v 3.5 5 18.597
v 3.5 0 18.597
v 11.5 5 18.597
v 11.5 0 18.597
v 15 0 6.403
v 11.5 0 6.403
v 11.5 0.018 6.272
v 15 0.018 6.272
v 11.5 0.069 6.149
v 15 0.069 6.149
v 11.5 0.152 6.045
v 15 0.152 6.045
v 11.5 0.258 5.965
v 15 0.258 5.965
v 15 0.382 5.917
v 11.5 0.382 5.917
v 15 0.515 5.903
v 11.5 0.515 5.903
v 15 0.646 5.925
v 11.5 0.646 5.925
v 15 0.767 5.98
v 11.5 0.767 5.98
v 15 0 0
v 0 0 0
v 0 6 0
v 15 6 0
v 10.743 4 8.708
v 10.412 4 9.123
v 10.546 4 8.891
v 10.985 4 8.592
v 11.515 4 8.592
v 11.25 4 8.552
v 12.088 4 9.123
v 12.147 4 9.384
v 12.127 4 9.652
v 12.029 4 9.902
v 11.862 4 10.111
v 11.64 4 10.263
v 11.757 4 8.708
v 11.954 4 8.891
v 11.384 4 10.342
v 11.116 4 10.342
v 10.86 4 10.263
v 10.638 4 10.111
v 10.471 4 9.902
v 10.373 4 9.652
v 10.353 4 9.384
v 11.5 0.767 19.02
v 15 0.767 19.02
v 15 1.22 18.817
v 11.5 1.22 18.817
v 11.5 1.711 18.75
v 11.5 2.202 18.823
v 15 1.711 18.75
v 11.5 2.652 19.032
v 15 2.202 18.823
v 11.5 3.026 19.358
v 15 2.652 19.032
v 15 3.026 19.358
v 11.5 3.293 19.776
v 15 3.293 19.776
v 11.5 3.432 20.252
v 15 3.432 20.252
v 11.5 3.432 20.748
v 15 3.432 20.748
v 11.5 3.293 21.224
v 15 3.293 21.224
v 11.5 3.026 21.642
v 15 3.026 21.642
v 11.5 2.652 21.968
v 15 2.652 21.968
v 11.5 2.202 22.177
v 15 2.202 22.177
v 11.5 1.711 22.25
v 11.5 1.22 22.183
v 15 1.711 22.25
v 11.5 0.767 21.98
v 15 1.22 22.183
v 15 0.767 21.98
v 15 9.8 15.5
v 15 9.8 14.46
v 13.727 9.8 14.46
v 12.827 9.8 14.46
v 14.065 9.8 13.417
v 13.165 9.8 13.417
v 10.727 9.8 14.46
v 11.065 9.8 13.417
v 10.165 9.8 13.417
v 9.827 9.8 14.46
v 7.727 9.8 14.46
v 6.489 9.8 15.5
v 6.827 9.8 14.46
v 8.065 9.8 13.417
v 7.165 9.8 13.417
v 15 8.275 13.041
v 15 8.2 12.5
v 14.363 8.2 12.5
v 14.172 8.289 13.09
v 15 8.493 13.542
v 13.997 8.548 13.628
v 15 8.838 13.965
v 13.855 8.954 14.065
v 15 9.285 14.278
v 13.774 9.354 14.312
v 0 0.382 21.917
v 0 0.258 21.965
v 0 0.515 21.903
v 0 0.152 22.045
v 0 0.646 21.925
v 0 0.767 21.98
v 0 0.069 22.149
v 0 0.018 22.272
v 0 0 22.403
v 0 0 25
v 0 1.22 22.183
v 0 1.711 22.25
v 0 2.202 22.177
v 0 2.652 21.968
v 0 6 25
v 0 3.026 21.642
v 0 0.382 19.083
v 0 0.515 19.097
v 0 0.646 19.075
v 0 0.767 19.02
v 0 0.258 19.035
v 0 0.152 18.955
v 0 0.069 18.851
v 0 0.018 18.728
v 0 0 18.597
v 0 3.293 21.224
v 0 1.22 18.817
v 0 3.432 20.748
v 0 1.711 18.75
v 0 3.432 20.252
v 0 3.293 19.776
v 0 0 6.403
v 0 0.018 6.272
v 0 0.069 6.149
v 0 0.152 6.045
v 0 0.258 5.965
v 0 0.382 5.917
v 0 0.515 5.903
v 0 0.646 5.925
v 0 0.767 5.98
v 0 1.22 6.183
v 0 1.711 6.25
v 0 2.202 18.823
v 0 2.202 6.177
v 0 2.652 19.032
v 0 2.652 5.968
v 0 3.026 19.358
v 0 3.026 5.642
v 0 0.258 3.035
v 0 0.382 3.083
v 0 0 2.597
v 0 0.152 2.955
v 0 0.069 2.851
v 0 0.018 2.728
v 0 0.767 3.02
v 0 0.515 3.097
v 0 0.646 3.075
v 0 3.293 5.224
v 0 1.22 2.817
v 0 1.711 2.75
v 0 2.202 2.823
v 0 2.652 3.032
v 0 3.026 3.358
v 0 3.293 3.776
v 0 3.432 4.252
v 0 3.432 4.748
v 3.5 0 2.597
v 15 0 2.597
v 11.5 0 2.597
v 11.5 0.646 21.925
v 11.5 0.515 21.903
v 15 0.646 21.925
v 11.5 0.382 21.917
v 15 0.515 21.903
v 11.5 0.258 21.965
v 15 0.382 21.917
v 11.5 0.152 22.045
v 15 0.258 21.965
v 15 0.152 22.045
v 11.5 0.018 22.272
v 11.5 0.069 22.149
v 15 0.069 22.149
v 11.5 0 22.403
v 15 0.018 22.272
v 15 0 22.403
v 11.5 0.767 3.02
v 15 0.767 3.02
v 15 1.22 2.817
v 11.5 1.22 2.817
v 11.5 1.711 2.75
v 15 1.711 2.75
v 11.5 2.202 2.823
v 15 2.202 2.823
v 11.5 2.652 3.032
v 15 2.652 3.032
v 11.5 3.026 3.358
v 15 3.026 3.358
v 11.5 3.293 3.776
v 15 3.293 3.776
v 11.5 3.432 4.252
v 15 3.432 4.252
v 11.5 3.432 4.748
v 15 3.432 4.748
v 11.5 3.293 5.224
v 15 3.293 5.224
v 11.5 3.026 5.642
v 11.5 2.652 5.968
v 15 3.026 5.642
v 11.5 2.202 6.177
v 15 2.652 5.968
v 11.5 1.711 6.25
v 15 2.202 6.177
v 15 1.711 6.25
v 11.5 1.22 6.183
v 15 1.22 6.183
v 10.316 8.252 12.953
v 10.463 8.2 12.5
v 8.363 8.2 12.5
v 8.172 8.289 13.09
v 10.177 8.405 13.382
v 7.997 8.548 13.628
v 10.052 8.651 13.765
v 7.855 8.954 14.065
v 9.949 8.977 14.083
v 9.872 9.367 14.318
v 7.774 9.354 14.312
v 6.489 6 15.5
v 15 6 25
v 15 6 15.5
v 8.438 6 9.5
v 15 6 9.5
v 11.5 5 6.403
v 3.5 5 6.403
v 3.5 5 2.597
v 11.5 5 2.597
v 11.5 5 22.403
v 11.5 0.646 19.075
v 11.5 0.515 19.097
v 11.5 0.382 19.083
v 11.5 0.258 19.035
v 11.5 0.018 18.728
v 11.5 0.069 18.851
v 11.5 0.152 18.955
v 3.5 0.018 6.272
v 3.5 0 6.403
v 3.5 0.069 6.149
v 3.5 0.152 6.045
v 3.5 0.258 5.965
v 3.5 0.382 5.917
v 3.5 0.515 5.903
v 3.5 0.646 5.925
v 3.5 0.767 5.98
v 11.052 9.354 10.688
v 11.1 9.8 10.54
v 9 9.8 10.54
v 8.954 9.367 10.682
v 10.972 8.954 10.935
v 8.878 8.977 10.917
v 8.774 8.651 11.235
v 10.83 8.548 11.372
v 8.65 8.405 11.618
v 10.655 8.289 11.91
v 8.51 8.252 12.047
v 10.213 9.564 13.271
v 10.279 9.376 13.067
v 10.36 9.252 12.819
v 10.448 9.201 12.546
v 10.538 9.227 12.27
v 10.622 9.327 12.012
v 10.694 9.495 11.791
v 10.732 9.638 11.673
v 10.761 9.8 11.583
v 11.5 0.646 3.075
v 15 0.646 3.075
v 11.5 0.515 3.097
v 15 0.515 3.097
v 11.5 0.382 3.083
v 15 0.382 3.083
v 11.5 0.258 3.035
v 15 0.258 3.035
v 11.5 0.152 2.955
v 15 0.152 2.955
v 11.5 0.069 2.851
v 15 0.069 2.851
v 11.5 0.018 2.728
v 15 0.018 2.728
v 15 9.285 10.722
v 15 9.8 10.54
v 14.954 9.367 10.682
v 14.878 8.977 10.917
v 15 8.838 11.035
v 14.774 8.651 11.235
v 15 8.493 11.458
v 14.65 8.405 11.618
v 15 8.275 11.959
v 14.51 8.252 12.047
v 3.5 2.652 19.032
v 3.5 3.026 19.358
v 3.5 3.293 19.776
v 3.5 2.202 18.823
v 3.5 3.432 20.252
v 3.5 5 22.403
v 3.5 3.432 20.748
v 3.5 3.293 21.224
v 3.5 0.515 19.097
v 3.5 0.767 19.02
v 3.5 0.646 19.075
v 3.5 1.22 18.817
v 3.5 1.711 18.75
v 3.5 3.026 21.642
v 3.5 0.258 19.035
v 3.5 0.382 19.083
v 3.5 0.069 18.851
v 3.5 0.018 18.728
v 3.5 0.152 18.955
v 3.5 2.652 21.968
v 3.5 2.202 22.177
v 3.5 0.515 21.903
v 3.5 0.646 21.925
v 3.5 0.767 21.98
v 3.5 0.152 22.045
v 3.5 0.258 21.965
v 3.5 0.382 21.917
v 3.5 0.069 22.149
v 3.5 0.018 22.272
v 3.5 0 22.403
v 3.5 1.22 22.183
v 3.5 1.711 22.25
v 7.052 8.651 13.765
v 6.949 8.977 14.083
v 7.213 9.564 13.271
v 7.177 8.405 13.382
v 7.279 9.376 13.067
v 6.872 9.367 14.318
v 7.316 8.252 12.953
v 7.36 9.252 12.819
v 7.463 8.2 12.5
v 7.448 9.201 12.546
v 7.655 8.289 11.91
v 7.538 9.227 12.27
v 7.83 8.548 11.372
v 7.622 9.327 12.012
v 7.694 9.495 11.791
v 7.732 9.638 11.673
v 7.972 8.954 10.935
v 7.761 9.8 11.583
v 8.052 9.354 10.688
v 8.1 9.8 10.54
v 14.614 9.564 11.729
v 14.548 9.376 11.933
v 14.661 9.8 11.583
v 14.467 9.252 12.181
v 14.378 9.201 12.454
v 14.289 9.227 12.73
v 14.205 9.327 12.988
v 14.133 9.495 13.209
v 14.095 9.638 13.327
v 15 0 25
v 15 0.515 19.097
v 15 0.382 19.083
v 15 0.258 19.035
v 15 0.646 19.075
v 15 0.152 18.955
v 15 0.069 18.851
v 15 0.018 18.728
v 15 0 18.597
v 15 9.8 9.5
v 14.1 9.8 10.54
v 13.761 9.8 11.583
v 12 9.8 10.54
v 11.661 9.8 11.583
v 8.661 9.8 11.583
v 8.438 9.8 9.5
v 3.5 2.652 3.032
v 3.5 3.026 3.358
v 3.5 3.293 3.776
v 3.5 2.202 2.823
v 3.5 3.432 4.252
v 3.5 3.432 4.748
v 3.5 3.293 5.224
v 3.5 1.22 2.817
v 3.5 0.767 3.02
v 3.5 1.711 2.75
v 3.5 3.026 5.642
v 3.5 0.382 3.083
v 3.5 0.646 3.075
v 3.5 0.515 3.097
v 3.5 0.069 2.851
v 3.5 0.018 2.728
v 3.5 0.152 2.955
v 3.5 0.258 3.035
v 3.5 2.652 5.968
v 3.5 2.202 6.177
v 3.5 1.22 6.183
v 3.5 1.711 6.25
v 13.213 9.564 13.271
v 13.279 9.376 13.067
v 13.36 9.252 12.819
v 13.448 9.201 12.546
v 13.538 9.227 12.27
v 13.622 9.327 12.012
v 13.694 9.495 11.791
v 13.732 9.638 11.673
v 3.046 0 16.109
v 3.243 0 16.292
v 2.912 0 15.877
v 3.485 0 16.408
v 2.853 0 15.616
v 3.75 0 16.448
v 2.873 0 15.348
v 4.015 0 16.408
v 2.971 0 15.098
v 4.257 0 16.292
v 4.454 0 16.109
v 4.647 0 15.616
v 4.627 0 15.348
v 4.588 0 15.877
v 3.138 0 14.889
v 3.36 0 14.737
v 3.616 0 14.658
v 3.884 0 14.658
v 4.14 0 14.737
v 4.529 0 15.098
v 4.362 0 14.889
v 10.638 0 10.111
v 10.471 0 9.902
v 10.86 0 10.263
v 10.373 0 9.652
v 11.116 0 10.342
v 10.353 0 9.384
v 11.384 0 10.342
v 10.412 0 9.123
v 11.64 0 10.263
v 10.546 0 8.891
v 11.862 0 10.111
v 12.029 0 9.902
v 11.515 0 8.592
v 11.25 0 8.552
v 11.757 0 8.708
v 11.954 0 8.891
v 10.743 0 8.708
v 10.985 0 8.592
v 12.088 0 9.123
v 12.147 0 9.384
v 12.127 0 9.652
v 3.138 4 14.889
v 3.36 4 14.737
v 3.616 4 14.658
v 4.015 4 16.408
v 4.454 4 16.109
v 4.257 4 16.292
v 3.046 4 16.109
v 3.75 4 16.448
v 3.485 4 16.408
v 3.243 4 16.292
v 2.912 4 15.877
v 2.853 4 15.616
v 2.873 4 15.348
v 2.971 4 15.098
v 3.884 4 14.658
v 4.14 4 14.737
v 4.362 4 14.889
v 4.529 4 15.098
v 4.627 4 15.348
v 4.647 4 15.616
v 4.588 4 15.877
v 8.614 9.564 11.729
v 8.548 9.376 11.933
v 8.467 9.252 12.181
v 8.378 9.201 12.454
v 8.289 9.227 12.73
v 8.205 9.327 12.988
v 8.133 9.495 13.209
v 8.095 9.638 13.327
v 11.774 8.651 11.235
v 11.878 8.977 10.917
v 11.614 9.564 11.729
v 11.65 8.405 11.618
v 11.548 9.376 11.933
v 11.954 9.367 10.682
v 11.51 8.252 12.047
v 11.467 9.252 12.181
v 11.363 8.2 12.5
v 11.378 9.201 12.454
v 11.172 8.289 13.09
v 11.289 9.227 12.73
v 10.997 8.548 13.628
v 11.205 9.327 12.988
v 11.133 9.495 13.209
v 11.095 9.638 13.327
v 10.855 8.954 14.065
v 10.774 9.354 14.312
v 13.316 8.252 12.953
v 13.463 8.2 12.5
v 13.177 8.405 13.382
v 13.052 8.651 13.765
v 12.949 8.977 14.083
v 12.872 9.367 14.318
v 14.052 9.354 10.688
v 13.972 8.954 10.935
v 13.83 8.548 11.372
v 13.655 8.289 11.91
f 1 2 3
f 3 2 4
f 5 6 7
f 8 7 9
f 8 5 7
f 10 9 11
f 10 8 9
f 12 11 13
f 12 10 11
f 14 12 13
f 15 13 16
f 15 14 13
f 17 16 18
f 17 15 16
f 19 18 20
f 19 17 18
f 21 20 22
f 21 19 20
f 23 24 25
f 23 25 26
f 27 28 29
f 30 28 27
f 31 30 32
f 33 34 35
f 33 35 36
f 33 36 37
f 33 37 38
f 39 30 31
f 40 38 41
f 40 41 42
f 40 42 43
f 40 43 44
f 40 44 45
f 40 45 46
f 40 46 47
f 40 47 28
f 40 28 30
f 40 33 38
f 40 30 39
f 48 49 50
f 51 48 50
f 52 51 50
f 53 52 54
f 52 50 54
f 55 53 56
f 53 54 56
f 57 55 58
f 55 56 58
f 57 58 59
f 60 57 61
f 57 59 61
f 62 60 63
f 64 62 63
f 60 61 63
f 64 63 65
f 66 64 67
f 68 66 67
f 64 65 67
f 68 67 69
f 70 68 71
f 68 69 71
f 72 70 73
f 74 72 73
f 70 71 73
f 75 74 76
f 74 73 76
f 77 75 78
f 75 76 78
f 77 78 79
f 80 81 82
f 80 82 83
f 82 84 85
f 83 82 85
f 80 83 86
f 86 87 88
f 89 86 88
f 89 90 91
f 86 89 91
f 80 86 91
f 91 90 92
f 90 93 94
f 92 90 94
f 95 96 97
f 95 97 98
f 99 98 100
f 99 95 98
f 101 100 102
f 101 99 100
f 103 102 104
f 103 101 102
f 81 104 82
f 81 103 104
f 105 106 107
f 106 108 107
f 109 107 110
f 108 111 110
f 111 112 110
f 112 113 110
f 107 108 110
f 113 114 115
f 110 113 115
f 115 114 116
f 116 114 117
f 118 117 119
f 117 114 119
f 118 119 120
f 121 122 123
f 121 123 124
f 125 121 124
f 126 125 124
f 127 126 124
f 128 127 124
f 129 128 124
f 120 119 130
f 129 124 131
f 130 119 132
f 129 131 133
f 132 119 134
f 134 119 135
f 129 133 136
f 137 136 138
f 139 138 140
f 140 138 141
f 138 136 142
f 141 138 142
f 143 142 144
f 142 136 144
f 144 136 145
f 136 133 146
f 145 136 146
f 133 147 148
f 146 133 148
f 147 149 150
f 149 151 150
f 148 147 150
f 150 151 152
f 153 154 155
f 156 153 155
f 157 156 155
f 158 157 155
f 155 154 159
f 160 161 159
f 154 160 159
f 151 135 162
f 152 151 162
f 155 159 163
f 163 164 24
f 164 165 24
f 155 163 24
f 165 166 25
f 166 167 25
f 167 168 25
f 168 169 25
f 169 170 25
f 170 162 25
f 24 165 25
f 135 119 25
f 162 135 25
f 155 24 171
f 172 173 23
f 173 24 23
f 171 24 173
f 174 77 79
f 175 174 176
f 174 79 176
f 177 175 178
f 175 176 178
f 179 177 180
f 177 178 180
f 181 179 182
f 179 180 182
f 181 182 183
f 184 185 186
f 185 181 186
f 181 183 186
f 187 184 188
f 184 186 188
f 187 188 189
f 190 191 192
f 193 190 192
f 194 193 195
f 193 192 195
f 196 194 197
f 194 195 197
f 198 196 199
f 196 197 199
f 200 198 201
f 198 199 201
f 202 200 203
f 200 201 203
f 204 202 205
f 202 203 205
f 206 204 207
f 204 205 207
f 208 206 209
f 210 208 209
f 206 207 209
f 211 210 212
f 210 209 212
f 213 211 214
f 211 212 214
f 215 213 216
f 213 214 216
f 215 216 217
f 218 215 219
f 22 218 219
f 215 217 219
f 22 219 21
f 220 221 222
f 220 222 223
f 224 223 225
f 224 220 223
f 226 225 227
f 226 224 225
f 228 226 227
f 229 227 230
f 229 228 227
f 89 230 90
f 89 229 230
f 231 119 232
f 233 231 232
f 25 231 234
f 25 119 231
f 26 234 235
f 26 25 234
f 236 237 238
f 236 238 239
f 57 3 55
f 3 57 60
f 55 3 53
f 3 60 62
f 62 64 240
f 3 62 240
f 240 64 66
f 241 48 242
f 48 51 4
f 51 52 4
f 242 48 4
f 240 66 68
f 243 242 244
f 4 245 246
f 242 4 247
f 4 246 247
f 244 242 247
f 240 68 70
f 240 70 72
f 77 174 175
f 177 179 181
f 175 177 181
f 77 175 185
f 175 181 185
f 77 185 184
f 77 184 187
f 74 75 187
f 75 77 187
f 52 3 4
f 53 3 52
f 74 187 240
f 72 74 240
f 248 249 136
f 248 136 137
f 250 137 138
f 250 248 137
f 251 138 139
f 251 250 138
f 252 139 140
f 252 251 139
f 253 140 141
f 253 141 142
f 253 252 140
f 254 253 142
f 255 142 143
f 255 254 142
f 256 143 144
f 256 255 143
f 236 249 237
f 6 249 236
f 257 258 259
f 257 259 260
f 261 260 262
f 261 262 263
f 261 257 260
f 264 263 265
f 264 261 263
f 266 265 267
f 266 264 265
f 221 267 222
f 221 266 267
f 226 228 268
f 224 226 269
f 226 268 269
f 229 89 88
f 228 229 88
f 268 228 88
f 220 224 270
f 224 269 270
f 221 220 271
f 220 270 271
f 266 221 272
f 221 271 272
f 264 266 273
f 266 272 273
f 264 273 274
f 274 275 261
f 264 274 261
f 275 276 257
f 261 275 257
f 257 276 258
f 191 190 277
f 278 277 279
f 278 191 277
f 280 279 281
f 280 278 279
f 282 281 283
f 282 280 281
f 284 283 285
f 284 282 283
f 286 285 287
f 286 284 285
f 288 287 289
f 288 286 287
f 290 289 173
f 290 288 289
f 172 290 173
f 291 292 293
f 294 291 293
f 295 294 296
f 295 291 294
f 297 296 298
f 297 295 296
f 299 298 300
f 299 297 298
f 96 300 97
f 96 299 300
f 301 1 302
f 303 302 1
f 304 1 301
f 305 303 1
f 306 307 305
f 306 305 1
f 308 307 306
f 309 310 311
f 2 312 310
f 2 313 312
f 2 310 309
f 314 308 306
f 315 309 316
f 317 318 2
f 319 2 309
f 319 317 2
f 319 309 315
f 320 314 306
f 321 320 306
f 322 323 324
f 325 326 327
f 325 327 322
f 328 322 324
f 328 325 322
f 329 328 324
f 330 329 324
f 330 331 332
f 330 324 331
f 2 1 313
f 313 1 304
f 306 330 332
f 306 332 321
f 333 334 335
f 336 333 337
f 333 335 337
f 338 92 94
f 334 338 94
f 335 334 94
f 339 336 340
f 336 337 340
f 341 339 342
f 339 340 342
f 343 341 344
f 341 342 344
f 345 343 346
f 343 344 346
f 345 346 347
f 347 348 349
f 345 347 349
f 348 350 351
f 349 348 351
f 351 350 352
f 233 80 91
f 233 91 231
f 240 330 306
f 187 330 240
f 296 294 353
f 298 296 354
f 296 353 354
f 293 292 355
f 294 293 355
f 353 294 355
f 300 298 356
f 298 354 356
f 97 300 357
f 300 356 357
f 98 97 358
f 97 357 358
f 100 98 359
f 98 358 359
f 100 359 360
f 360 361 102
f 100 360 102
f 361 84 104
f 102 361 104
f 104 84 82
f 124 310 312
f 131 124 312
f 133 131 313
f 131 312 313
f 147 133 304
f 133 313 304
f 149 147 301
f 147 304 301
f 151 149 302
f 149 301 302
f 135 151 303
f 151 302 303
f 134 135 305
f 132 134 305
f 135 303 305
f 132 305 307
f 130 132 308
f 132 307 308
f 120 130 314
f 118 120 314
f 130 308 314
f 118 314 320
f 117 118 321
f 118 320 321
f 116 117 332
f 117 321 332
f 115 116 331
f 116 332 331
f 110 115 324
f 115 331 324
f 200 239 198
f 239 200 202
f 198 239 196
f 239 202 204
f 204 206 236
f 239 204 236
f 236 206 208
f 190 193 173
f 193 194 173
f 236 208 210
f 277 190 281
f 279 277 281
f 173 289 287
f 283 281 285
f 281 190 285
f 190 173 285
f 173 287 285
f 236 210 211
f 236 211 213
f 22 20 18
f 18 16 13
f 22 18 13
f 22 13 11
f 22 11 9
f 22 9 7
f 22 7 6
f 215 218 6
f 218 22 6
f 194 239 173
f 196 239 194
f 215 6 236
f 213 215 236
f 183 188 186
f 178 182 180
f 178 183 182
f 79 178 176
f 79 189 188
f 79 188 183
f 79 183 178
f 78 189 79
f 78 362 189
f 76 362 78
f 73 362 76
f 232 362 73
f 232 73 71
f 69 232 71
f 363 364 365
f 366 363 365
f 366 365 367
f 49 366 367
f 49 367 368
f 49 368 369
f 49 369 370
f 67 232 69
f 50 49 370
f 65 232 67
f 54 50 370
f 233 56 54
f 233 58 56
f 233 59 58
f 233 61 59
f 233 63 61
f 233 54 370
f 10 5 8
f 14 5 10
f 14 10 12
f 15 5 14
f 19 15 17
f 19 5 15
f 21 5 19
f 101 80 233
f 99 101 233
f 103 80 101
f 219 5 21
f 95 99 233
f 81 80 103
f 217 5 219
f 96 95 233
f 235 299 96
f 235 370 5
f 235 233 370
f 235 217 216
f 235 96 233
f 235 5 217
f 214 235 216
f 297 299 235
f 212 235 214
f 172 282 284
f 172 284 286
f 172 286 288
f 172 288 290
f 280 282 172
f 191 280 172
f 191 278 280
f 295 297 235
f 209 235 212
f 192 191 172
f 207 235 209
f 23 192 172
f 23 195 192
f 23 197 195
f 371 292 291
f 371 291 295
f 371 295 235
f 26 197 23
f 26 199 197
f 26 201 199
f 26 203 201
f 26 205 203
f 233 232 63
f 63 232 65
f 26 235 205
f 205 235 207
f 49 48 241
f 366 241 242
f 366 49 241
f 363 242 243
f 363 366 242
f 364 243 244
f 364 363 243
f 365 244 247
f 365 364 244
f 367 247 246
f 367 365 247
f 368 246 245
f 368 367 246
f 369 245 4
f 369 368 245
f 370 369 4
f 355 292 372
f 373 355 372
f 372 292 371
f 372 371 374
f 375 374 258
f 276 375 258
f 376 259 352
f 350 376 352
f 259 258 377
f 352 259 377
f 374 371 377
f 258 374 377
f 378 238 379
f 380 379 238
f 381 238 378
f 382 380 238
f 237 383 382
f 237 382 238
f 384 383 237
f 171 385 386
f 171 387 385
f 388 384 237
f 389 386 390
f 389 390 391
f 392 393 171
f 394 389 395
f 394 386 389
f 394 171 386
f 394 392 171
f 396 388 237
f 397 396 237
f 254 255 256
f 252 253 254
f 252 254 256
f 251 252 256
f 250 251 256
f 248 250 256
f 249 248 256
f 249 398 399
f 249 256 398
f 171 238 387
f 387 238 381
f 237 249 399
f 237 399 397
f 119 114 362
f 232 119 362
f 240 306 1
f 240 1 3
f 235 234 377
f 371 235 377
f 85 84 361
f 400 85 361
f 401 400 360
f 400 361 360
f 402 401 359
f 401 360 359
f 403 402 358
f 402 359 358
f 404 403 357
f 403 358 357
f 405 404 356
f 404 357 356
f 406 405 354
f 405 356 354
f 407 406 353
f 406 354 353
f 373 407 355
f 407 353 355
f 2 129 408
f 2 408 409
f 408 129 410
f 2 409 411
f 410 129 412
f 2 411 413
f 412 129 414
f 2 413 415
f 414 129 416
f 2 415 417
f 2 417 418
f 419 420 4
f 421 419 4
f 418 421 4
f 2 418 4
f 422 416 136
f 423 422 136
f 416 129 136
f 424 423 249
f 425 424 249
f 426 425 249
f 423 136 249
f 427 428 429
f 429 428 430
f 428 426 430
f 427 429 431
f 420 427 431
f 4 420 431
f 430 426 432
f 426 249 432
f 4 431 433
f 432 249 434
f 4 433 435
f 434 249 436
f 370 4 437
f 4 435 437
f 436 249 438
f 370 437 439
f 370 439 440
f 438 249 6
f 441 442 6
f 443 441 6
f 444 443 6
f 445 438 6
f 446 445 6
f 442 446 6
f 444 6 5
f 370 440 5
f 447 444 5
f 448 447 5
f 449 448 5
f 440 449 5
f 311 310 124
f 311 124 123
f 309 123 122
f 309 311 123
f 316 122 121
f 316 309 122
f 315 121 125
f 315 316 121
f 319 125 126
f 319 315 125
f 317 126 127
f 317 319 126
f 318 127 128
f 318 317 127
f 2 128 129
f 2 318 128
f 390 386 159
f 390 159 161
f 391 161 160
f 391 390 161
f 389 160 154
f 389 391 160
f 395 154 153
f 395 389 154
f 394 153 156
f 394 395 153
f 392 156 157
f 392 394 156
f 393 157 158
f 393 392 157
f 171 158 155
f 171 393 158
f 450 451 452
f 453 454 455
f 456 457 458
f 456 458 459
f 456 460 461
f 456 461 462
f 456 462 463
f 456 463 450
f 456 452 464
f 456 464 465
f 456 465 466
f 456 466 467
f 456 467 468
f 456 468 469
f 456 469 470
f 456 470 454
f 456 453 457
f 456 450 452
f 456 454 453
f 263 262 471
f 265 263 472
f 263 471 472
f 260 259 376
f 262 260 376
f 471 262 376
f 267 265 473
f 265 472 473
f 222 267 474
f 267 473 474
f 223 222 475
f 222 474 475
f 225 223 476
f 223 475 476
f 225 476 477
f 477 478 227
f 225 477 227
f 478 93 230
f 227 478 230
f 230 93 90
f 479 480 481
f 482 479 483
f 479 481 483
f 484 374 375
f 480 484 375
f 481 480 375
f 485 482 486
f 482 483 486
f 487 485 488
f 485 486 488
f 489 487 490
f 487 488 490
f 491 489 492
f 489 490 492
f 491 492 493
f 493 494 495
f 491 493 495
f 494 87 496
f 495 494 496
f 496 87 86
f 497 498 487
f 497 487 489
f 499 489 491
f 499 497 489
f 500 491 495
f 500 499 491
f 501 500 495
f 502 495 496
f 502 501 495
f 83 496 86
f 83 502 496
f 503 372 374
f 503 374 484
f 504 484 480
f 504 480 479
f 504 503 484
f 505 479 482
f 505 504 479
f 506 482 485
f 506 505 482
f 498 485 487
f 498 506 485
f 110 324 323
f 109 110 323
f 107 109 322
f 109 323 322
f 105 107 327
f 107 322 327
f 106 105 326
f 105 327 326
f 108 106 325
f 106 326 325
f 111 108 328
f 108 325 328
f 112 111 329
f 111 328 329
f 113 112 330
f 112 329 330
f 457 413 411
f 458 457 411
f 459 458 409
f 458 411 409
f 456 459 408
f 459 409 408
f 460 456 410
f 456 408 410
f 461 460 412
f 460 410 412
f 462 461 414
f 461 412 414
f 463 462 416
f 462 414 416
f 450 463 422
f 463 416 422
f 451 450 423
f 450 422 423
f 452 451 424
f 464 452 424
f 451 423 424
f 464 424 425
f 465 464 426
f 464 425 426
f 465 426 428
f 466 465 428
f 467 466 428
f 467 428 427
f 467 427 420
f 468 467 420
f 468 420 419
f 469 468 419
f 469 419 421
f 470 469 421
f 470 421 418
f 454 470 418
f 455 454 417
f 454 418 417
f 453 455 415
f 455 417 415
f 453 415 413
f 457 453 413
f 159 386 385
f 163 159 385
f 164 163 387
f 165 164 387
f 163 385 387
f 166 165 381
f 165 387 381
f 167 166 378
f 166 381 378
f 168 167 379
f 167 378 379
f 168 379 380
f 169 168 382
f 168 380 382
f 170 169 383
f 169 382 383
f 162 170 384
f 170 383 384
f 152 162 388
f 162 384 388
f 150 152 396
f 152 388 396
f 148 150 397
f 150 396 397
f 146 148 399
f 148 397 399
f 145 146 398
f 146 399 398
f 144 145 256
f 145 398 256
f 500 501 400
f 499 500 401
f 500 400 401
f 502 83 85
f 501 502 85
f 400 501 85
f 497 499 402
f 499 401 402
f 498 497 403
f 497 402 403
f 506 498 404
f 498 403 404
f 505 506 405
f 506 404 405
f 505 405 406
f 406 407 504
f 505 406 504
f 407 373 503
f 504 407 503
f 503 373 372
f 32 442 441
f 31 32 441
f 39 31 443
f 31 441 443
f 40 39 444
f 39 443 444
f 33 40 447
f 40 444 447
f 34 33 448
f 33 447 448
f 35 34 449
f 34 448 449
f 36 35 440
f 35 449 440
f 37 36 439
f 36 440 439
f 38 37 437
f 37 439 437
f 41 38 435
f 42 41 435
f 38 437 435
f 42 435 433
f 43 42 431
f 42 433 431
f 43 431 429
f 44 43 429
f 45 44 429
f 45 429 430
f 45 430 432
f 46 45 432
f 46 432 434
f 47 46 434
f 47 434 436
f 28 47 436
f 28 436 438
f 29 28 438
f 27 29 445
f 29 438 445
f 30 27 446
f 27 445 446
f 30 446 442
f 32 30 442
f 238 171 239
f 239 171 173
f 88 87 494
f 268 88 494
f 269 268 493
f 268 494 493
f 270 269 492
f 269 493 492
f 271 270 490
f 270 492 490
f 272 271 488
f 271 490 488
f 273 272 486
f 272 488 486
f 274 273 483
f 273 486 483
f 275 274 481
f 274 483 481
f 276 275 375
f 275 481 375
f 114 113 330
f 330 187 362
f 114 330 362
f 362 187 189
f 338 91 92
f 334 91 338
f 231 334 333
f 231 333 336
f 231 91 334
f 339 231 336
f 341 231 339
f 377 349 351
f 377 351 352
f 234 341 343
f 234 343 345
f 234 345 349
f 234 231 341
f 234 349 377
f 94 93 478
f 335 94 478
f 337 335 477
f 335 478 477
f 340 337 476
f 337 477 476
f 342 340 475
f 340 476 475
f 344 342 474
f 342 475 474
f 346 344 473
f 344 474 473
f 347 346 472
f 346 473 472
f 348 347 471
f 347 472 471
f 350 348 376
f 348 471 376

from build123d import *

# Parameters (mm, degrees)
SKETCH_1_W          = 15
SKETCH_1_H          = 25
EXTRUDE_1_DEPTH     = 6
SKETCH_3_R          = 1.75
CUT_EXTRUDE_1_DEPTH = 15
FILLET_1_R          = 0.5
SKETCH_4_W          = 15
SKETCH_4_H          = 6
EXTRUDE_3_DEPTH     = 2.2
EXTRUDE_4_DEPTH     = 15
EXTRUDE_5_REACH     = 32.758
CUT_EXTRUDE_2_REACH = 32.758
SKETCH_8_R          = 1
CUT_EXTRUDE_START   = 6
CUT_EXTRUDE_3_DEPTH = 3.8
SKETCH_10_W         = 8
SKETCH_10_H         = 3.806573262
CUT_EXTRUDE_5_DEPTH = 5
SKETCH_12_R         = 0.9
CUT_EXTRUDE_7_DEPTH = 4


# Read off the part's stored shape, not the designer's step: 切除-拉伸3
with BuildPart() as part:
    # 草图1 → 凸台-拉伸1 (new body)
    with BuildSketch(Plane(origin=(0, 0, 0), x_dir=(1, 0, 0), z_dir=(0, 1, 0))):
        with Locations((7.5, -12.5)):
            Rectangle(SKETCH_1_W, SKETCH_1_H)
    extrude(amount=EXTRUDE_1_DEPTH)

    # 草图3 → 切除-拉伸1 (cut)
    with BuildSketch(Plane(origin=(15, 0, 0), x_dir=(0, 0, -1), z_dir=(1, 0, 0))):
        with Locations((-20.5, 1.7)):
            Circle(SKETCH_3_R)
        with Locations((-4.5, 1.7)):
            Circle(SKETCH_3_R)
    extrude(amount=-CUT_EXTRUDE_1_DEPTH, mode=Mode.SUBTRACT)

    # 圆角1
    fillet_1_edges = [part.edges().sort_by_distance(p)[0] for p in [
        (7.5, 0, 4.084668807),
        (7.5, 0, 4.915331193),
        (7.5, 0, 20.084668807),
        (7.5, 0, 20.915331193),
    ]]
    fillet(fillet_1_edges, radius=FILLET_1_R)

    # 草图4 → 凸台-拉伸3 (add)
    with BuildSketch(Plane(origin=(0, 6, 0), x_dir=(1, 0, 0), z_dir=(0, 1, 0))):
        with Locations((7.5, -12.5)):
            Rectangle(SKETCH_4_W, SKETCH_4_H)
    extrude(amount=EXTRUDE_3_DEPTH)

    # 草图6 → 凸台-拉伸4 (add)
    with BuildSketch(Plane(origin=(15, 0, 0), x_dir=(0, 0, -1), z_dir=(1, 0, 0))):
        with BuildLine():
            ThreePointArc((-10.540408206, 9.8), (-11.235088936, 8.650806662), (-12.5, 8.2))
            Line((-12.5, 8.2), (-9.5, 8.2))
            Line((-9.5, 8.2), (-9.5, 9.8))
            Line((-9.5, 9.8), (-10.540408206, 9.8))
        make_face()
        with BuildLine():
            Line((-15.5, 9.8), (-15.5, 8.2))
            Line((-15.5, 8.2), (-12.5, 8.2))
            ThreePointArc((-12.5, 8.2), (-13.764911064, 8.650806662), (-14.459591794, 9.8))
            Line((-14.459591794, 9.8), (-15.5, 9.8))
        make_face()
    extrude(amount=-EXTRUDE_4_DEPTH)

    # 草图7 → 凸台-拉伸5 (add, up to next)
    with BuildSketch(Plane(origin=(0, 9.8, 0), x_dir=(1, 0, 0), z_dir=(0, 1, 0)), mode=Mode.PRIVATE) as extrude_5_sk1:
        Polygon((14.1, -10.540408206), (15, -10.540408206), (13.726580059, -14.459591794), (12.826580059, -14.459591794), align=None)
    extrude_5_tool1 = extrude(extrude_5_sk1.sketch, amount=-EXTRUDE_5_REACH, mode=Mode.PRIVATE) - part.part
    # 草图7 → 凸台-拉伸5 (add, up to next)
    with BuildSketch(Plane(origin=(0, 9.8, 0), x_dir=(1, 0, 0), z_dir=(0, 1, 0)), mode=Mode.PRIVATE) as extrude_5_sk2:
        Polygon((11.1, -10.540408206), (12, -10.540408206), (10.726580059, -14.459591794), (9.826580059, -14.459591794), align=None)
    extrude_5_tool2 = extrude(extrude_5_sk2.sketch, amount=-EXTRUDE_5_REACH, mode=Mode.PRIVATE) - part.part
    # 草图7 → 凸台-拉伸5 (add, up to next)
    with BuildSketch(Plane(origin=(0, 9.8, 0), x_dir=(1, 0, 0), z_dir=(0, 1, 0)), mode=Mode.PRIVATE) as extrude_5_sk3:
        Polygon((8.1, -10.540408206), (9, -10.540408206), (7.726580059, -14.459591794), (6.826580059, -14.459591794), align=None)
    extrude_5_tool3 = extrude(extrude_5_sk3.sketch, amount=-EXTRUDE_5_REACH, mode=Mode.PRIVATE) - part.part
    # 草图7 → 凸台-拉伸5 (add, up to next)
    with BuildSketch(Plane(origin=(0, 9.8, 0), x_dir=(1, 0, 0), z_dir=(0, 1, 0)), mode=Mode.PRIVATE) as extrude_5_sk4:
        Polygon((5.1, -10.540408206), (6, -10.540408206), (4.726580059, -14.459591794), (3.826580059, -14.459591794), align=None)
    extrude_5_tool4 = extrude(extrude_5_sk4.sketch, amount=-EXTRUDE_5_REACH, mode=Mode.PRIVATE) - part.part
    # 草图7 → 凸台-拉伸5 (add, up to next)
    with BuildSketch(Plane(origin=(0, 9.8, 0), x_dir=(1, 0, 0), z_dir=(0, 1, 0)), mode=Mode.PRIVATE) as extrude_5_sk5:
        Polygon((2.1, -10.540408206), (3, -10.540408206), (1.726580059, -14.459591794), (0.826580059, -14.459591794), align=None)
    extrude_5_tool5 = extrude(extrude_5_sk5.sketch, amount=-EXTRUDE_5_REACH, mode=Mode.PRIVATE) - part.part
    add(extrude_5_tool1.solids().sort_by_distance((13.91329, 9.8, 12.5))[0])
    add(extrude_5_tool2.solids().sort_by_distance((10.91329, 9.8, 12.5))[0])
    add(extrude_5_tool3.solids().sort_by_distance((7.91329, 9.8, 12.5))[0])
    add(extrude_5_tool4.solids().sort_by_distance((4.91329, 9.8, 12.5))[0])
    add(extrude_5_tool5.solids().sort_by_distance((1.91329, 9.8, 12.5))[0])

    # 切除-拉伸2: up to this face of the body (flat: up to its plane)
    cut_extrude_2_end = Plane(part.part.faces().sort_by_distance((0, 3.752278375, 12.5))[0])
    # 草图8 → 切除-拉伸2 (cut, up to the picked face)
    with BuildSketch(Plane(origin=(15, 0, 0), x_dir=(0, 0, -1), z_dir=(1, 0, 0)), mode=Mode.PRIVATE) as cut_extrude_2_sk1:
        with Locations((-12.5, 10.2)):
            Circle(SKETCH_8_R)
    cut_extrude_2_tool1 = split(extrude(cut_extrude_2_sk1.sketch, amount=-CUT_EXTRUDE_2_REACH, mode=Mode.PRIVATE), bisect_by=cut_extrude_2_end, keep=Keep.BOTH, mode=Mode.PRIVATE)
    add(cut_extrude_2_tool1.solids().sort_by(Axis((15, 10.2, 12.5), (-1, 0, 0)))[0], mode=Mode.SUBTRACT)

    # 切除-拉伸3 outline → 切除-拉伸3 (cut)
    with BuildSketch(Plane(origin=(0, 0, 0), x_dir=(1, 0, 0), z_dir=(0, 1, 0)).offset(CUT_EXTRUDE_START)):
        Polygon((6.488530941, -15.5), (8.438049118, -9.5), (0, -9.5), (0, -15.5), align=None)
    extrude(amount=CUT_EXTRUDE_3_DEPTH, mode=Mode.SUBTRACT)

    # 草图10 → 切除-拉伸5 (cut)
    with BuildSketch(Plane.XZ):
        with Locations((7.5, 20.5)):
            Rectangle(SKETCH_10_W, SKETCH_10_H)
        with Locations((7.5, 4.5)):
            Rectangle(SKETCH_10_W, SKETCH_10_H)
    extrude(amount=-CUT_EXTRUDE_5_DEPTH, mode=Mode.SUBTRACT)

    # 草图12 → 切除-拉伸7 (cut)
    with BuildSketch(Plane.XZ):
        with Locations(Location((11.25, 9.451643316, 0), (0, 0, 270))):
            Circle(SKETCH_12_R)
        with Locations(Location((3.75, 15.548356684, 0), (0, 0, 90))):
            Circle(SKETCH_12_R)
    extrude(amount=-CUT_EXTRUDE_7_DEPTH, mode=Mode.SUBTRACT)


solid = part.part
